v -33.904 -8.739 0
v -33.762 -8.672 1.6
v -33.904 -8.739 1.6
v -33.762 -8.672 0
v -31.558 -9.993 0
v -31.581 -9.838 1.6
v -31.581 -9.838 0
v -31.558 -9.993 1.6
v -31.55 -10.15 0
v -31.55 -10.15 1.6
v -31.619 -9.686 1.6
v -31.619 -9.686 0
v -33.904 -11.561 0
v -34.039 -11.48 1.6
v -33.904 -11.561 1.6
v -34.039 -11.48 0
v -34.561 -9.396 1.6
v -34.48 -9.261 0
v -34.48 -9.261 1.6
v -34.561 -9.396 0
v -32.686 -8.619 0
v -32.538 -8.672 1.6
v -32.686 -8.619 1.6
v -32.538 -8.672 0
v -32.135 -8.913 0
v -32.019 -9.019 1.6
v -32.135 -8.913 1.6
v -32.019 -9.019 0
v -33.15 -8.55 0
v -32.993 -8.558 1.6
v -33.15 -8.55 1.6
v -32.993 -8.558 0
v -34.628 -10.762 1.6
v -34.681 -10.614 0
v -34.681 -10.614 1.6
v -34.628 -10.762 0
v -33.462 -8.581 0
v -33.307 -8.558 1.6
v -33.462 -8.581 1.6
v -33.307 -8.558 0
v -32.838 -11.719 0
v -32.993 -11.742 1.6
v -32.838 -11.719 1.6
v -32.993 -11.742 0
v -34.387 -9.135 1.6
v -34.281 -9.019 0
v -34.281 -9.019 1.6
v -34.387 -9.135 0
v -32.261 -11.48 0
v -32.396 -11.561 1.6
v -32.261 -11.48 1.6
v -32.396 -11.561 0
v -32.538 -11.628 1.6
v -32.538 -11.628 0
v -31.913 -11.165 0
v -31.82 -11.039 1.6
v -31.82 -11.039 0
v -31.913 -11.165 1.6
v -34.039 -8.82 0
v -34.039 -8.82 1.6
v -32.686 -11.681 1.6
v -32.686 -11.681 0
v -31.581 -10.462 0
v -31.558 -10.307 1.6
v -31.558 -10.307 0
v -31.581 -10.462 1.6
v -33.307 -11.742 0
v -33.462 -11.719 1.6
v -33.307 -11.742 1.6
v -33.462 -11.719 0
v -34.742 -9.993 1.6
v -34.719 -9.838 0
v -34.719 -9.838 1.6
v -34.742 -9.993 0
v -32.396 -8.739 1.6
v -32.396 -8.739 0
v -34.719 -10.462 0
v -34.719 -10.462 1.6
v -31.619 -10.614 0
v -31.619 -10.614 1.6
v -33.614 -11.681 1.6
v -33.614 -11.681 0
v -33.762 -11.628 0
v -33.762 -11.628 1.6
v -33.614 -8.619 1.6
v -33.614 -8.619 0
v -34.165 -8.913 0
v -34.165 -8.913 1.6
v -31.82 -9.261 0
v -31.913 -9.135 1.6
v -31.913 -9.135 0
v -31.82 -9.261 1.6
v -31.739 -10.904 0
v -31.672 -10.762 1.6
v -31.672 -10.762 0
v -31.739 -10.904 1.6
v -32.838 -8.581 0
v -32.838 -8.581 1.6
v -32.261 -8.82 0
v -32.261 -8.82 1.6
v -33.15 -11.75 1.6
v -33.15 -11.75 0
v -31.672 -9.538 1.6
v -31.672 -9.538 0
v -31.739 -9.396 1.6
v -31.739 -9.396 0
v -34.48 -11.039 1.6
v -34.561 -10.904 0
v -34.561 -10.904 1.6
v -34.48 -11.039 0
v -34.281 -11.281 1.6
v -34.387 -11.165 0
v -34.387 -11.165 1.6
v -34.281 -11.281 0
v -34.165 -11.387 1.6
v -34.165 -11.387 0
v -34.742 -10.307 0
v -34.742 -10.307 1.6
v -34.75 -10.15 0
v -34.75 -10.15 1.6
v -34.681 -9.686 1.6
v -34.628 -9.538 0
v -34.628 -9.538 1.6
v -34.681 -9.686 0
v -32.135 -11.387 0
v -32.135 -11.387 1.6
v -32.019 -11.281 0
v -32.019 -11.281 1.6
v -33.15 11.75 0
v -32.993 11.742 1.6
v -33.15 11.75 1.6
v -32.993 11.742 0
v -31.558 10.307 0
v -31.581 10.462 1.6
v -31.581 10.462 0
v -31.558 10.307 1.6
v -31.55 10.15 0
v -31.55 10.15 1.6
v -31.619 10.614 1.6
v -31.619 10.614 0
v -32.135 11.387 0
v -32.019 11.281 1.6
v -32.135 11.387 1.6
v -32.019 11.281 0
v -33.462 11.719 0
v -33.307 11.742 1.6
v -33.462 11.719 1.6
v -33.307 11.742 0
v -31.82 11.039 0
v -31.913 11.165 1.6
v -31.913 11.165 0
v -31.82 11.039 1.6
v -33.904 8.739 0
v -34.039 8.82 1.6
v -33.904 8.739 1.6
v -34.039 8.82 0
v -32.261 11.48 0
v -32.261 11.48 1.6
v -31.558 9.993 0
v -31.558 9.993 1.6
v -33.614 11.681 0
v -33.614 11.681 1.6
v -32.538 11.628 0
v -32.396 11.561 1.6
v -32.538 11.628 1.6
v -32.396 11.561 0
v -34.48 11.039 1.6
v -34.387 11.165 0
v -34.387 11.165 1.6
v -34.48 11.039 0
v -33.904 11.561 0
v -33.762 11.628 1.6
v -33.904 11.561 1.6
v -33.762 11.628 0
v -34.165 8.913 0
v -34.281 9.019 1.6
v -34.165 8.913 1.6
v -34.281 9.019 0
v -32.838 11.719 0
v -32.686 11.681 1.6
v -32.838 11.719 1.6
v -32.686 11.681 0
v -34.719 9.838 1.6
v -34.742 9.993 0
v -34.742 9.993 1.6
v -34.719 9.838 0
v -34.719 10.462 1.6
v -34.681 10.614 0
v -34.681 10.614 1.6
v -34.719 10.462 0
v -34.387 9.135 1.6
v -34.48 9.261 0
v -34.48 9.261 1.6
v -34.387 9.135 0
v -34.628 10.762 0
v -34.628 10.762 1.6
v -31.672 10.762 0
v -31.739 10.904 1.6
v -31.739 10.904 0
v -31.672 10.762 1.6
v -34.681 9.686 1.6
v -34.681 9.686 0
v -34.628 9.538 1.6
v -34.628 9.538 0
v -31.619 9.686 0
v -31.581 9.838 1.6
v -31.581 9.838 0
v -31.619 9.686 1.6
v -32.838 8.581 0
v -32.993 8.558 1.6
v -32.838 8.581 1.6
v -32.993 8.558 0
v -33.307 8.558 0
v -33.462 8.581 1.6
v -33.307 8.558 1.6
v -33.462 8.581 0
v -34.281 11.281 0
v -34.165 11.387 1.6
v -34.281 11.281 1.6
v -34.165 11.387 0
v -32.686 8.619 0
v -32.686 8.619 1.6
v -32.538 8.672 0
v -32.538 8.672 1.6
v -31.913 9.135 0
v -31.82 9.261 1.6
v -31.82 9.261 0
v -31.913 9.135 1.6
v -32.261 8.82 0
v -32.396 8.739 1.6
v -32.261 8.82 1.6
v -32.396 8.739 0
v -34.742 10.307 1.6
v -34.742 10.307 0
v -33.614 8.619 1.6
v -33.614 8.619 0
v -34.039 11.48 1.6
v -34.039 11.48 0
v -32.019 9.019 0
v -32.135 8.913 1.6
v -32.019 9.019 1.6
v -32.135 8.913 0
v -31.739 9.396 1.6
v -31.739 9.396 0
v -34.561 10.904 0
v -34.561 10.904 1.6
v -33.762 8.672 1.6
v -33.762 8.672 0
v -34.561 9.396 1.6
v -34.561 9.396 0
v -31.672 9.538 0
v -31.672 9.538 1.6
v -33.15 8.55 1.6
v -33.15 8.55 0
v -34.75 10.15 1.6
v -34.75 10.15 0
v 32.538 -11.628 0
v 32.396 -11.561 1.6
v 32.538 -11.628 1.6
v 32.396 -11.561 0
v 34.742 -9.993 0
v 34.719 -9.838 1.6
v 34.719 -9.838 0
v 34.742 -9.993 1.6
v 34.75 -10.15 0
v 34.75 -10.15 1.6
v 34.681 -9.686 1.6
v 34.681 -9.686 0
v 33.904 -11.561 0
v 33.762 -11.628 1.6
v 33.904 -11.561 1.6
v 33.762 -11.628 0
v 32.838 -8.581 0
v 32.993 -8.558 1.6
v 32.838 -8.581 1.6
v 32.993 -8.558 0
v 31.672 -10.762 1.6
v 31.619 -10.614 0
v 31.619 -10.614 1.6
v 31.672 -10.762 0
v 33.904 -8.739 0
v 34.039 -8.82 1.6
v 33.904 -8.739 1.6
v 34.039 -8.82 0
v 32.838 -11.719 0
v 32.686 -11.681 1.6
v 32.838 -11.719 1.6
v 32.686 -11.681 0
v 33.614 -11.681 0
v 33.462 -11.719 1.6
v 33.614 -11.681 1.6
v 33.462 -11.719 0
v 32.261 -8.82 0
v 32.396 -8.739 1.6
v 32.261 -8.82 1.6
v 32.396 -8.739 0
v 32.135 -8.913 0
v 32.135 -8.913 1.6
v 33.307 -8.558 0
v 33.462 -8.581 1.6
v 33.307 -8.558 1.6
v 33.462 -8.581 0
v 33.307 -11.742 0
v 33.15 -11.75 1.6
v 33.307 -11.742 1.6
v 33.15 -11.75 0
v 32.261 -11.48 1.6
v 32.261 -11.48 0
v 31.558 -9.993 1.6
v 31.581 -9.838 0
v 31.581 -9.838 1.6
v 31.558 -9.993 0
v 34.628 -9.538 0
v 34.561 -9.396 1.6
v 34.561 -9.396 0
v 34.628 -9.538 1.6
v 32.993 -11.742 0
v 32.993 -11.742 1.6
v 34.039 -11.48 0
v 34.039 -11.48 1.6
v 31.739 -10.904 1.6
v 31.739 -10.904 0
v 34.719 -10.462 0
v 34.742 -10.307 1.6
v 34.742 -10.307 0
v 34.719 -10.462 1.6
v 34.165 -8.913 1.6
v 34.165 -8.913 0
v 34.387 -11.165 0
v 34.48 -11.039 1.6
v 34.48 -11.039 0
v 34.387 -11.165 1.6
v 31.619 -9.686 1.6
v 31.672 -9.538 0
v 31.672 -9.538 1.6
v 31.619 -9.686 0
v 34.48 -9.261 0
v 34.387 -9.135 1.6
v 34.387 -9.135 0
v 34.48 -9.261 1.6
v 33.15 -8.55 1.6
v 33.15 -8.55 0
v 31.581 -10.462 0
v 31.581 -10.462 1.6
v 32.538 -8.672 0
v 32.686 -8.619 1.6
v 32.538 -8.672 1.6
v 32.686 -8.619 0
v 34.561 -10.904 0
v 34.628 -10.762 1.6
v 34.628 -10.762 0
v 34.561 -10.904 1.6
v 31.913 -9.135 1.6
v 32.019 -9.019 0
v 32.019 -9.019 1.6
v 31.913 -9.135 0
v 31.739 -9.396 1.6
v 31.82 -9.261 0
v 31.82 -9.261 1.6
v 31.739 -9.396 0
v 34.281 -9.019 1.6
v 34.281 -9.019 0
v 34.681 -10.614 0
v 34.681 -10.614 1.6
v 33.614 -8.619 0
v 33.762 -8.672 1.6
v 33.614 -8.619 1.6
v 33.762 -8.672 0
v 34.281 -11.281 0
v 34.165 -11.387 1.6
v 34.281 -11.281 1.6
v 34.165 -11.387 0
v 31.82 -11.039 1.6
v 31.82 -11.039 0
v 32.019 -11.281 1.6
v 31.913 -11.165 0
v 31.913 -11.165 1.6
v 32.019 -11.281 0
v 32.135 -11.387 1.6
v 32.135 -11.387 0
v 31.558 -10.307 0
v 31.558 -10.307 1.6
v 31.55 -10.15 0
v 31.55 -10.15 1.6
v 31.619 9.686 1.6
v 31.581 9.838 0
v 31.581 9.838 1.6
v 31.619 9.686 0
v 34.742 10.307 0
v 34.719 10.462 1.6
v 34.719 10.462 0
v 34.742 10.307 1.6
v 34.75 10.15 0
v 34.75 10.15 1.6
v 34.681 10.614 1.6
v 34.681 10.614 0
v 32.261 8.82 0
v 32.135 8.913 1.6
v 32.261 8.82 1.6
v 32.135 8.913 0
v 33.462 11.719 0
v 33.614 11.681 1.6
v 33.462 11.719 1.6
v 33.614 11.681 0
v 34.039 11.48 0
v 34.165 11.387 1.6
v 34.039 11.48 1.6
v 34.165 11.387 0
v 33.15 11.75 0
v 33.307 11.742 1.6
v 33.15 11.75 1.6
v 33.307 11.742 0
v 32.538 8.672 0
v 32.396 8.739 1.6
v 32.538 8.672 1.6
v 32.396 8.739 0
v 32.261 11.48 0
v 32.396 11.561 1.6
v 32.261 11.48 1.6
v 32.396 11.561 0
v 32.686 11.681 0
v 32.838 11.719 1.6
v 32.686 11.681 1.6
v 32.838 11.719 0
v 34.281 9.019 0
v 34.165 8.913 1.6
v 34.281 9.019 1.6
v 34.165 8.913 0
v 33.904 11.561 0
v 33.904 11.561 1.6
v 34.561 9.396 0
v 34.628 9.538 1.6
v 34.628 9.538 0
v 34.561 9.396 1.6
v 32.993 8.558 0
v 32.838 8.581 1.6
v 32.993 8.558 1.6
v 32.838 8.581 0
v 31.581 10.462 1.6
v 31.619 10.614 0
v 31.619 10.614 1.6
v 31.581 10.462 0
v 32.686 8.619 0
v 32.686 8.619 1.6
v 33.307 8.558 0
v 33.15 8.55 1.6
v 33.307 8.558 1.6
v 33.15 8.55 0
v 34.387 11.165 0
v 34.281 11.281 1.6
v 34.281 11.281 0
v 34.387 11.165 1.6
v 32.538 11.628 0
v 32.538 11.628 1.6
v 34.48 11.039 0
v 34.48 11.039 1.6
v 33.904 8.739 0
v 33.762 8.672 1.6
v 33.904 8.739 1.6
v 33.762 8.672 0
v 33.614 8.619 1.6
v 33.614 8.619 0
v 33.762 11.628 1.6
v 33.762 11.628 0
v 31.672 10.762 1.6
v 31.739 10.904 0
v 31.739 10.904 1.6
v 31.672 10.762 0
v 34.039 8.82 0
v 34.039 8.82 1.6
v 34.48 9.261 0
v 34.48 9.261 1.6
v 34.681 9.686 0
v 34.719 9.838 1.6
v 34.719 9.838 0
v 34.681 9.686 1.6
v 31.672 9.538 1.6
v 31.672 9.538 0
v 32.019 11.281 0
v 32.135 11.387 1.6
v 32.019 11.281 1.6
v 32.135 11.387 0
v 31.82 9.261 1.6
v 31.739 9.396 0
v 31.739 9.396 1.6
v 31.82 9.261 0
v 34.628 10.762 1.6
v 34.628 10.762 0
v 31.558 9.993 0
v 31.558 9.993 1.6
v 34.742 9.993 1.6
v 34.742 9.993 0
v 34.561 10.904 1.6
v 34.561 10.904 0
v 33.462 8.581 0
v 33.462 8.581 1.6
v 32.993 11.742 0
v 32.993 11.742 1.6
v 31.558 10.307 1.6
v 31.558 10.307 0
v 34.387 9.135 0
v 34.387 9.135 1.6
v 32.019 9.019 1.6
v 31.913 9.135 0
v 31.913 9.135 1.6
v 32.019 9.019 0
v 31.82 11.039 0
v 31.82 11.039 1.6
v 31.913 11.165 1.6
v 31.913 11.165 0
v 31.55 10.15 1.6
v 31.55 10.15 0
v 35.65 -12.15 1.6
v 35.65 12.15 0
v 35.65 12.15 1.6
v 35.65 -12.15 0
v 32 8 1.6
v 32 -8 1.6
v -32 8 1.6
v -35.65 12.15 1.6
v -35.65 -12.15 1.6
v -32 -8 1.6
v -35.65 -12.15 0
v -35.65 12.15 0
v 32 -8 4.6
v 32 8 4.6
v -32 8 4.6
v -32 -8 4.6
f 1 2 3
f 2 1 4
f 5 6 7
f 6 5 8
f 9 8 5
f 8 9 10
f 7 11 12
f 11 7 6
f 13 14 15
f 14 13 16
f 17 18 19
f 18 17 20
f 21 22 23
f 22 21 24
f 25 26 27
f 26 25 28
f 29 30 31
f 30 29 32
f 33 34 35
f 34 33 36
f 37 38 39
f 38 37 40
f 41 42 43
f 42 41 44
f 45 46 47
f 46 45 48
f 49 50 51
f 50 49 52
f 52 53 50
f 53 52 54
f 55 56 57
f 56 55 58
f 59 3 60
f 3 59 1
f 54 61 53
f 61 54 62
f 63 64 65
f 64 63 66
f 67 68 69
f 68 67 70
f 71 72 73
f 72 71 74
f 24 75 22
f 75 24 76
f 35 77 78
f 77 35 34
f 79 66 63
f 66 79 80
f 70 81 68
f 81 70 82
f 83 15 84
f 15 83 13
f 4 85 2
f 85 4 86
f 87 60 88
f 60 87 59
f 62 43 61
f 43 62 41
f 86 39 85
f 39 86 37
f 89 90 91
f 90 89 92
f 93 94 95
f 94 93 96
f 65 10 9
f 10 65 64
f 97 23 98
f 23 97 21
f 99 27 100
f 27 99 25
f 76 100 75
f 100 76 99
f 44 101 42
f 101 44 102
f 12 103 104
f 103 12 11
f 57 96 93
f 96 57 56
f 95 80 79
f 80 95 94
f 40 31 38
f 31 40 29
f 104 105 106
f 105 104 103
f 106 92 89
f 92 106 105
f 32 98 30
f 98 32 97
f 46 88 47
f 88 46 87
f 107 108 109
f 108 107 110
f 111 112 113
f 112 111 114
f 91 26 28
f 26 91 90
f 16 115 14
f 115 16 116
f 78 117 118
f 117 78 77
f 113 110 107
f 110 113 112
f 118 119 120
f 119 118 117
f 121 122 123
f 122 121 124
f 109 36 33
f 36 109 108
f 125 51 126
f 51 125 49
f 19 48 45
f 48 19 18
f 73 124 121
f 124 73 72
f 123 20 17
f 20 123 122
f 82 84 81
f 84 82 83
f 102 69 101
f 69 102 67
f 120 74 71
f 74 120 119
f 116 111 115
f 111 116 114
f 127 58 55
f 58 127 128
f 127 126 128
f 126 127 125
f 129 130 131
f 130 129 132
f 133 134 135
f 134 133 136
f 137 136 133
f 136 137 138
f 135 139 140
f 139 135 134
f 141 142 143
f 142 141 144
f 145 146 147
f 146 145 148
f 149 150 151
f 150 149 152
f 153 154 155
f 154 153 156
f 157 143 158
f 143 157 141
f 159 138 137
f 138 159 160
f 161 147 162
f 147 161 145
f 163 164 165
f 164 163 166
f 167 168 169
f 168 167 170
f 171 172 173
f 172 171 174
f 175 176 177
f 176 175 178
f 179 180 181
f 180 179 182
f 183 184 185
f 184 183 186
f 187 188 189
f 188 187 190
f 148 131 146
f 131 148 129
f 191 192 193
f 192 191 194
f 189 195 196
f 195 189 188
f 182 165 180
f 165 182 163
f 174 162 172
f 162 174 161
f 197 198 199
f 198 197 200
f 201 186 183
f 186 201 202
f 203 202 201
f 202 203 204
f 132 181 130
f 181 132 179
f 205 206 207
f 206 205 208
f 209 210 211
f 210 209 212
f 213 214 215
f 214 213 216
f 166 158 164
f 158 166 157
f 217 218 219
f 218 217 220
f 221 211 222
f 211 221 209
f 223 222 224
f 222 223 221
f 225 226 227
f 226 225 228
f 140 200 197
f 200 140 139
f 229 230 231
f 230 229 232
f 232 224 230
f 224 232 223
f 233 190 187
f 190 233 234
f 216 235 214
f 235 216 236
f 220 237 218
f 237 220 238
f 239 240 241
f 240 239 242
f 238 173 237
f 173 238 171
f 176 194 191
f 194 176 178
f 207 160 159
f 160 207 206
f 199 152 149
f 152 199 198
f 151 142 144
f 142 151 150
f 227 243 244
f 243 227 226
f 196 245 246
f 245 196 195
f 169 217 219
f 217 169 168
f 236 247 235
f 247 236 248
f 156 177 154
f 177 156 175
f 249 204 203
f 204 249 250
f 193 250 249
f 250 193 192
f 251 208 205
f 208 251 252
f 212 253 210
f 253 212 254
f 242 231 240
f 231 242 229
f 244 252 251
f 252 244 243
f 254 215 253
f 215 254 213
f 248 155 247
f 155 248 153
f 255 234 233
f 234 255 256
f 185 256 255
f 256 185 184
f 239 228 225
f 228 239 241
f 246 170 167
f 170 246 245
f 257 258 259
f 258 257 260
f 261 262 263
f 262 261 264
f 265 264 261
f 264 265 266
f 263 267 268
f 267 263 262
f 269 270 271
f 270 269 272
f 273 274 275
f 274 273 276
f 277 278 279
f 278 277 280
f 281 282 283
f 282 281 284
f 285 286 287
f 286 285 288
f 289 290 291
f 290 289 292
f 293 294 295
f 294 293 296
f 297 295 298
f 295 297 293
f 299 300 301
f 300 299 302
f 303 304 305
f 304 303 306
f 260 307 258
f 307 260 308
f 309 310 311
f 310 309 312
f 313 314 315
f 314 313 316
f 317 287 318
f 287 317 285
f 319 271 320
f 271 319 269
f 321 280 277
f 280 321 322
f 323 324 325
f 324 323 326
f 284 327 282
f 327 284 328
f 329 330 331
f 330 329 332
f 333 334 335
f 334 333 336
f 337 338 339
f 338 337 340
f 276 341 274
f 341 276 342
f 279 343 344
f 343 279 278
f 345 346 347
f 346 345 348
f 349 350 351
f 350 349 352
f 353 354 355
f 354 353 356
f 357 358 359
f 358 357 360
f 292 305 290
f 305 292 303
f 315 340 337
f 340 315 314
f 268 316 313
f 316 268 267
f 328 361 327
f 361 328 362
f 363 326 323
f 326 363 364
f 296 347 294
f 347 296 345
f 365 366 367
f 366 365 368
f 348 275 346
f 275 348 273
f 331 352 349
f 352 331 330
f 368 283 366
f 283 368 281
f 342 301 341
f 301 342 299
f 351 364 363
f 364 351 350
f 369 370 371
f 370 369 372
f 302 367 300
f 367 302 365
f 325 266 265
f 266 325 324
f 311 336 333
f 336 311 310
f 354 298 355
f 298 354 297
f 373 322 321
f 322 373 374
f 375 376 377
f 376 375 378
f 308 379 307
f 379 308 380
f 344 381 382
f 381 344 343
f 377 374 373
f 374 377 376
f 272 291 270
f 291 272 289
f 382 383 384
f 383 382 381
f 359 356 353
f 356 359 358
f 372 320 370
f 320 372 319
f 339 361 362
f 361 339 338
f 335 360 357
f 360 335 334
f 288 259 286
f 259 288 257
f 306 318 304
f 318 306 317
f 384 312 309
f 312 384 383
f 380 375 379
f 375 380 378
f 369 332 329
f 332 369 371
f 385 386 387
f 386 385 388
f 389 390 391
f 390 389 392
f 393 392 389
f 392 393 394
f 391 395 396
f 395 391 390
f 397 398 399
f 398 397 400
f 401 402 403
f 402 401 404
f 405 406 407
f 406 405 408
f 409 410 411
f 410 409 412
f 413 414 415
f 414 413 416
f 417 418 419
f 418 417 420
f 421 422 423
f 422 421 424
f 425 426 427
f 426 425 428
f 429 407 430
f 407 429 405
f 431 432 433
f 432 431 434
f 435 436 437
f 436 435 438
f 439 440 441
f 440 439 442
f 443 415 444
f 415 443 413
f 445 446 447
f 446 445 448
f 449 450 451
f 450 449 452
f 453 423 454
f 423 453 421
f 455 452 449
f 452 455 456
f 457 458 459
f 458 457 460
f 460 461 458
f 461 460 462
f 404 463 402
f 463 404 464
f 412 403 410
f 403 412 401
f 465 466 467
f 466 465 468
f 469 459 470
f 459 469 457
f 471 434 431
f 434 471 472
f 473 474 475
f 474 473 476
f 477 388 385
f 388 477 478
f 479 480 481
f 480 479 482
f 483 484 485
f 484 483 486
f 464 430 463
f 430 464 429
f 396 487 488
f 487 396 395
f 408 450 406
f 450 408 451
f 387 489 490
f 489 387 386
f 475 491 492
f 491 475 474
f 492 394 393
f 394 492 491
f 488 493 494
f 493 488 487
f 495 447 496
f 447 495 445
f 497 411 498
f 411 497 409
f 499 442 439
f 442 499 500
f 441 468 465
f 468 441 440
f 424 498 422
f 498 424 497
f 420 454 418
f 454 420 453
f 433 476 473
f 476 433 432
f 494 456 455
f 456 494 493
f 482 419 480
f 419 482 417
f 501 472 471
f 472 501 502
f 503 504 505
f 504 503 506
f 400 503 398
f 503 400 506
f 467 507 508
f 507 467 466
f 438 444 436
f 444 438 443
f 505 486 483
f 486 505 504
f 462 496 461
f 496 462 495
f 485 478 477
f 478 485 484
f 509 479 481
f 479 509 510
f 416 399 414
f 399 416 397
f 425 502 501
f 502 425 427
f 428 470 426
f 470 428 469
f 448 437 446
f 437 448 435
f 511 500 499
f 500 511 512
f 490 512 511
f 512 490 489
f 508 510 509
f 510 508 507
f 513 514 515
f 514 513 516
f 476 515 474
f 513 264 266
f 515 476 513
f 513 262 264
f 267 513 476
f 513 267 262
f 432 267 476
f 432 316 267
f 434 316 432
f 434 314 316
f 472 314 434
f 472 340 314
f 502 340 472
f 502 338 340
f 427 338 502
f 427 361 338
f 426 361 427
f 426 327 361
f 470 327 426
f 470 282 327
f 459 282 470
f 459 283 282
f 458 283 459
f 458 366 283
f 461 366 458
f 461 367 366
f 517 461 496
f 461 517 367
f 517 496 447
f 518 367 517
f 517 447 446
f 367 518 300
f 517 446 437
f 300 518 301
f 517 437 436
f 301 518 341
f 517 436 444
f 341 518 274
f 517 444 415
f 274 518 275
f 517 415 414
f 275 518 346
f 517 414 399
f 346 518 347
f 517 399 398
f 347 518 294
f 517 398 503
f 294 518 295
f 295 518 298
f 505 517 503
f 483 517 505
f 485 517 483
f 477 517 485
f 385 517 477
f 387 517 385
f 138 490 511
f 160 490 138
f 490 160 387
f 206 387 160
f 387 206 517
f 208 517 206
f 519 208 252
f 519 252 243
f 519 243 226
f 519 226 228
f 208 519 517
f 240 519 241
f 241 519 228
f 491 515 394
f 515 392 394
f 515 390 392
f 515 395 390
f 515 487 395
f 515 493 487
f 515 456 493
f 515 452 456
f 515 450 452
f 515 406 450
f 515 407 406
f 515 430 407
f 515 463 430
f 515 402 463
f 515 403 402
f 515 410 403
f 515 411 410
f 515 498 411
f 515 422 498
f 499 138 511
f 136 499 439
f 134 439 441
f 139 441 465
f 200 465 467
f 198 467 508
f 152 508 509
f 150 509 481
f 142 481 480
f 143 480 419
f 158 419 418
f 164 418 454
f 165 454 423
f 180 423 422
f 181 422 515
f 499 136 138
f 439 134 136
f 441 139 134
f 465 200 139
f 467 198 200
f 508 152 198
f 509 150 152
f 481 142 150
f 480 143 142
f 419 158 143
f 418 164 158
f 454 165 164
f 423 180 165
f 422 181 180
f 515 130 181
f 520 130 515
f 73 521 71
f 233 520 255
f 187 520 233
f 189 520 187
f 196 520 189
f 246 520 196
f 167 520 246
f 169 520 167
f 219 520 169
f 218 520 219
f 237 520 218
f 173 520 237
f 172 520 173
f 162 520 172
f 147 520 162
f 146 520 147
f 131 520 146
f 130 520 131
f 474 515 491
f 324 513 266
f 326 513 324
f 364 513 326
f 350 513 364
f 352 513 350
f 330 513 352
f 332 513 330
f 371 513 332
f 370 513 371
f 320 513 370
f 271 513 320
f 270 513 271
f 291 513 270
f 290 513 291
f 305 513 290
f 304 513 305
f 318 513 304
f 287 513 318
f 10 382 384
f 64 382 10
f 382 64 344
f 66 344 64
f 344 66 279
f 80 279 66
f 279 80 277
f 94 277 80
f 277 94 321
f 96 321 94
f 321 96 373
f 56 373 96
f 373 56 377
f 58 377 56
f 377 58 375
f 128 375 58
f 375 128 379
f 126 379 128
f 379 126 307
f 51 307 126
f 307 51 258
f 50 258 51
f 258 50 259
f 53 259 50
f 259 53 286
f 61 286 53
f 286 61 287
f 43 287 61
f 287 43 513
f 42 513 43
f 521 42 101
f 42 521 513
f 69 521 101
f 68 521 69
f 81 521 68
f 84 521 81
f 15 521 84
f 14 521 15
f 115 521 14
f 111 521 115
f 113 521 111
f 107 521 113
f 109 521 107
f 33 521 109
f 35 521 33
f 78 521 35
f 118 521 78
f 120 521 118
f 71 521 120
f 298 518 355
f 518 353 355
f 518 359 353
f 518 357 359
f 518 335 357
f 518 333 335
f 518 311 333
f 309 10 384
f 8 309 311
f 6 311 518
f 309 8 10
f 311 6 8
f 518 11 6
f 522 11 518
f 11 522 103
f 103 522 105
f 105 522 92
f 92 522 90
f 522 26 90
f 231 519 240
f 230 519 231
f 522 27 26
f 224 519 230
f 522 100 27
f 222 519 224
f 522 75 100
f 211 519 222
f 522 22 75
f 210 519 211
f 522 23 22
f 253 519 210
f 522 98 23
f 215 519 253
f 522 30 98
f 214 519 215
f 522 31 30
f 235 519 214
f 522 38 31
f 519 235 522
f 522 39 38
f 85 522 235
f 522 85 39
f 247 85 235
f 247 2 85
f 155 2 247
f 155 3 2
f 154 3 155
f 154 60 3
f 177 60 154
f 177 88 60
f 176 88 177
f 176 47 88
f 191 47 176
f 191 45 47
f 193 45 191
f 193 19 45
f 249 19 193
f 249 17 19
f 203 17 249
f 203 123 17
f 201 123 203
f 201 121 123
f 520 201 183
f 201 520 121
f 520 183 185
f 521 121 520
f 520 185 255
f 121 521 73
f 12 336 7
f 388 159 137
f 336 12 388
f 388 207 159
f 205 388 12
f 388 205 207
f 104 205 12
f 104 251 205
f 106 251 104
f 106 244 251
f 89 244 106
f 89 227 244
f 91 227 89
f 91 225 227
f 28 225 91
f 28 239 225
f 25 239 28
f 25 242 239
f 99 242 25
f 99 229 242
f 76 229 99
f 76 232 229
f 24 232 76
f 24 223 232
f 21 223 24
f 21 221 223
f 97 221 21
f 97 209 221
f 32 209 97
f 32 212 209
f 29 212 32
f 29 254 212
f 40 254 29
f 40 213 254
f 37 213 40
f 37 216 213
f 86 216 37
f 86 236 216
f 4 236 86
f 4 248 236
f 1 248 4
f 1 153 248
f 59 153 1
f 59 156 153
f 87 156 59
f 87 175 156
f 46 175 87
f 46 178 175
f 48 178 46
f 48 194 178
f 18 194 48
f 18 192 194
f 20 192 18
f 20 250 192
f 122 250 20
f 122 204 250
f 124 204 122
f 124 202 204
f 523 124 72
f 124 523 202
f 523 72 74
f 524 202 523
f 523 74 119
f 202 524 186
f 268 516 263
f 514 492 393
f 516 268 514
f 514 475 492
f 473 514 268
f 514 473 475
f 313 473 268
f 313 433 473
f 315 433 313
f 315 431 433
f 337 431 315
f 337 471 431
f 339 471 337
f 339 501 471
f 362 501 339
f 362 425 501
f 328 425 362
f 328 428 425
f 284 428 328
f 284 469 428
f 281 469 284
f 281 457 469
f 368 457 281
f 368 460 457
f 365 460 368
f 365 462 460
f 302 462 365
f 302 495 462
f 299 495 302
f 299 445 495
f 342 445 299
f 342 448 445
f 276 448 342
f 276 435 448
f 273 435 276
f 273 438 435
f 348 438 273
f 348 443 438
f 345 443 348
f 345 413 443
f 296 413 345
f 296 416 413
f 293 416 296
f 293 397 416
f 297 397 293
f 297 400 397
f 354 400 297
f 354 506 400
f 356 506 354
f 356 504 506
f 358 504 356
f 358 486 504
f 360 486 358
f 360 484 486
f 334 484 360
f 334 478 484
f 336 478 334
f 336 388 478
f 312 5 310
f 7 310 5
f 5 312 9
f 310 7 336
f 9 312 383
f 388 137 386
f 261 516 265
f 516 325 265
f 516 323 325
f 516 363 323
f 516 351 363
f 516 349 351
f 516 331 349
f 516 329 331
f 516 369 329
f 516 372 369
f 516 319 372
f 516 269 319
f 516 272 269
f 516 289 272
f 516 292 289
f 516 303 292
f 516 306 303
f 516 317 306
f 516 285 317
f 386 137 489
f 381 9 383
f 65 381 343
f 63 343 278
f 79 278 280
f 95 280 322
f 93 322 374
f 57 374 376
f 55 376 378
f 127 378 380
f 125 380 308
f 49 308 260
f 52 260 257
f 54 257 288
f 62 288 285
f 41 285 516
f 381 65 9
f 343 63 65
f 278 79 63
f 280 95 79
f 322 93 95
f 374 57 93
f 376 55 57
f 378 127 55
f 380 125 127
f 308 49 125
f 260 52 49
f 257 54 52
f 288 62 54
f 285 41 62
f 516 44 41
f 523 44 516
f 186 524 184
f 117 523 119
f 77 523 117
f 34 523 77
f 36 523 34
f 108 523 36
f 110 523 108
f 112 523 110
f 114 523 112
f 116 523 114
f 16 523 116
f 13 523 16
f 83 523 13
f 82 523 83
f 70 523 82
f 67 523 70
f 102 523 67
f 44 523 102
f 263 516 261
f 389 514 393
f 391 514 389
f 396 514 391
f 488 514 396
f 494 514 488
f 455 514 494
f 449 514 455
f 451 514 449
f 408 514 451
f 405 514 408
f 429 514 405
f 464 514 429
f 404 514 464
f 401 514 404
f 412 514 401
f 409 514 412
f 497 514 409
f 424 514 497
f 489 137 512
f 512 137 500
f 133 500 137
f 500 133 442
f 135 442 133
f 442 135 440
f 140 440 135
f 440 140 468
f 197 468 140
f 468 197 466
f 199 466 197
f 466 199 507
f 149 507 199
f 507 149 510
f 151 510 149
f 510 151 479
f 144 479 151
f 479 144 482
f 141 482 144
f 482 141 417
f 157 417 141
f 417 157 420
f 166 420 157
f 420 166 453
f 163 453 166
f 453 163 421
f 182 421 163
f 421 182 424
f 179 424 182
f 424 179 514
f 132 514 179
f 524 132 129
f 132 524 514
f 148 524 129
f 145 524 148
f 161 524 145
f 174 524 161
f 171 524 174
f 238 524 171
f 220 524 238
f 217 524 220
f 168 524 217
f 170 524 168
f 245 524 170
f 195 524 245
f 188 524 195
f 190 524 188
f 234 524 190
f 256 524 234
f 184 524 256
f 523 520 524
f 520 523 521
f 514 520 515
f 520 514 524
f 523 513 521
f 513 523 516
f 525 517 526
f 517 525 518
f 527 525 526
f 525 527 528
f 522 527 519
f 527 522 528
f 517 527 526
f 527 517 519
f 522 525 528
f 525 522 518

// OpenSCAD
$fn = 64;

// LCD 1602A display module (approx) 71.3mm x 24.3mm
// Simple renderable model: PCB + bezel + glass window + 4 mounting holes

module lcd1602a_module(
    pcb_x = 71.3,
    pcb_y = 24.3,
    pcb_t = 1.6,

    hole_d = 3.2,
    hole_edge_x = 2.5,   // distance from left/right edge to hole center
    hole_edge_y = 2.0,   // distance from bottom/top edge to hole center

    bezel_x = 64.0,
    bezel_y = 16.0,
    bezel_t = 3.0,
    bezel_z = 1.6,       // sits on top of PCB

    window_x = 56.0,
    window_y = 12.0,
    window_t = 1.2,
    window_inset = 0.8   // inset from bezel top
) {
    // PCB with mounting holes
    difference() {
        color([0.05, 0.35, 0.12])
            translate([-pcb_x/2, -pcb_y/2, 0])
                cube([pcb_x, pcb_y, pcb_t], center=false);

        for (sx = [-1, 1], sy = [-1, 1]) {
            translate([sx*(pcb_x/2 - hole_edge_x), sy*(pcb_y/2 - hole_edge_y), -0.1])
                cylinder(d=hole_d, h=pcb_t + 0.2);
        }
    }

    // Bezel/frame on top of PCB
    color([0.08, 0.08, 0.08])
        translate([-bezel_x/2, -bezel_y/2, bezel_z])
            cube([bezel_x, bezel_y, bezel_t], center=false);

    // Glass window on top of bezel
    color([0.2, 0.45, 0.55, 0.55])
        translate([-window_x/2, -window_y/2, bezel_z + bezel_t - window_t - window_inset])
            cube([window_x, window_y, window_t], center=false);
}

lcd1602a_module();
